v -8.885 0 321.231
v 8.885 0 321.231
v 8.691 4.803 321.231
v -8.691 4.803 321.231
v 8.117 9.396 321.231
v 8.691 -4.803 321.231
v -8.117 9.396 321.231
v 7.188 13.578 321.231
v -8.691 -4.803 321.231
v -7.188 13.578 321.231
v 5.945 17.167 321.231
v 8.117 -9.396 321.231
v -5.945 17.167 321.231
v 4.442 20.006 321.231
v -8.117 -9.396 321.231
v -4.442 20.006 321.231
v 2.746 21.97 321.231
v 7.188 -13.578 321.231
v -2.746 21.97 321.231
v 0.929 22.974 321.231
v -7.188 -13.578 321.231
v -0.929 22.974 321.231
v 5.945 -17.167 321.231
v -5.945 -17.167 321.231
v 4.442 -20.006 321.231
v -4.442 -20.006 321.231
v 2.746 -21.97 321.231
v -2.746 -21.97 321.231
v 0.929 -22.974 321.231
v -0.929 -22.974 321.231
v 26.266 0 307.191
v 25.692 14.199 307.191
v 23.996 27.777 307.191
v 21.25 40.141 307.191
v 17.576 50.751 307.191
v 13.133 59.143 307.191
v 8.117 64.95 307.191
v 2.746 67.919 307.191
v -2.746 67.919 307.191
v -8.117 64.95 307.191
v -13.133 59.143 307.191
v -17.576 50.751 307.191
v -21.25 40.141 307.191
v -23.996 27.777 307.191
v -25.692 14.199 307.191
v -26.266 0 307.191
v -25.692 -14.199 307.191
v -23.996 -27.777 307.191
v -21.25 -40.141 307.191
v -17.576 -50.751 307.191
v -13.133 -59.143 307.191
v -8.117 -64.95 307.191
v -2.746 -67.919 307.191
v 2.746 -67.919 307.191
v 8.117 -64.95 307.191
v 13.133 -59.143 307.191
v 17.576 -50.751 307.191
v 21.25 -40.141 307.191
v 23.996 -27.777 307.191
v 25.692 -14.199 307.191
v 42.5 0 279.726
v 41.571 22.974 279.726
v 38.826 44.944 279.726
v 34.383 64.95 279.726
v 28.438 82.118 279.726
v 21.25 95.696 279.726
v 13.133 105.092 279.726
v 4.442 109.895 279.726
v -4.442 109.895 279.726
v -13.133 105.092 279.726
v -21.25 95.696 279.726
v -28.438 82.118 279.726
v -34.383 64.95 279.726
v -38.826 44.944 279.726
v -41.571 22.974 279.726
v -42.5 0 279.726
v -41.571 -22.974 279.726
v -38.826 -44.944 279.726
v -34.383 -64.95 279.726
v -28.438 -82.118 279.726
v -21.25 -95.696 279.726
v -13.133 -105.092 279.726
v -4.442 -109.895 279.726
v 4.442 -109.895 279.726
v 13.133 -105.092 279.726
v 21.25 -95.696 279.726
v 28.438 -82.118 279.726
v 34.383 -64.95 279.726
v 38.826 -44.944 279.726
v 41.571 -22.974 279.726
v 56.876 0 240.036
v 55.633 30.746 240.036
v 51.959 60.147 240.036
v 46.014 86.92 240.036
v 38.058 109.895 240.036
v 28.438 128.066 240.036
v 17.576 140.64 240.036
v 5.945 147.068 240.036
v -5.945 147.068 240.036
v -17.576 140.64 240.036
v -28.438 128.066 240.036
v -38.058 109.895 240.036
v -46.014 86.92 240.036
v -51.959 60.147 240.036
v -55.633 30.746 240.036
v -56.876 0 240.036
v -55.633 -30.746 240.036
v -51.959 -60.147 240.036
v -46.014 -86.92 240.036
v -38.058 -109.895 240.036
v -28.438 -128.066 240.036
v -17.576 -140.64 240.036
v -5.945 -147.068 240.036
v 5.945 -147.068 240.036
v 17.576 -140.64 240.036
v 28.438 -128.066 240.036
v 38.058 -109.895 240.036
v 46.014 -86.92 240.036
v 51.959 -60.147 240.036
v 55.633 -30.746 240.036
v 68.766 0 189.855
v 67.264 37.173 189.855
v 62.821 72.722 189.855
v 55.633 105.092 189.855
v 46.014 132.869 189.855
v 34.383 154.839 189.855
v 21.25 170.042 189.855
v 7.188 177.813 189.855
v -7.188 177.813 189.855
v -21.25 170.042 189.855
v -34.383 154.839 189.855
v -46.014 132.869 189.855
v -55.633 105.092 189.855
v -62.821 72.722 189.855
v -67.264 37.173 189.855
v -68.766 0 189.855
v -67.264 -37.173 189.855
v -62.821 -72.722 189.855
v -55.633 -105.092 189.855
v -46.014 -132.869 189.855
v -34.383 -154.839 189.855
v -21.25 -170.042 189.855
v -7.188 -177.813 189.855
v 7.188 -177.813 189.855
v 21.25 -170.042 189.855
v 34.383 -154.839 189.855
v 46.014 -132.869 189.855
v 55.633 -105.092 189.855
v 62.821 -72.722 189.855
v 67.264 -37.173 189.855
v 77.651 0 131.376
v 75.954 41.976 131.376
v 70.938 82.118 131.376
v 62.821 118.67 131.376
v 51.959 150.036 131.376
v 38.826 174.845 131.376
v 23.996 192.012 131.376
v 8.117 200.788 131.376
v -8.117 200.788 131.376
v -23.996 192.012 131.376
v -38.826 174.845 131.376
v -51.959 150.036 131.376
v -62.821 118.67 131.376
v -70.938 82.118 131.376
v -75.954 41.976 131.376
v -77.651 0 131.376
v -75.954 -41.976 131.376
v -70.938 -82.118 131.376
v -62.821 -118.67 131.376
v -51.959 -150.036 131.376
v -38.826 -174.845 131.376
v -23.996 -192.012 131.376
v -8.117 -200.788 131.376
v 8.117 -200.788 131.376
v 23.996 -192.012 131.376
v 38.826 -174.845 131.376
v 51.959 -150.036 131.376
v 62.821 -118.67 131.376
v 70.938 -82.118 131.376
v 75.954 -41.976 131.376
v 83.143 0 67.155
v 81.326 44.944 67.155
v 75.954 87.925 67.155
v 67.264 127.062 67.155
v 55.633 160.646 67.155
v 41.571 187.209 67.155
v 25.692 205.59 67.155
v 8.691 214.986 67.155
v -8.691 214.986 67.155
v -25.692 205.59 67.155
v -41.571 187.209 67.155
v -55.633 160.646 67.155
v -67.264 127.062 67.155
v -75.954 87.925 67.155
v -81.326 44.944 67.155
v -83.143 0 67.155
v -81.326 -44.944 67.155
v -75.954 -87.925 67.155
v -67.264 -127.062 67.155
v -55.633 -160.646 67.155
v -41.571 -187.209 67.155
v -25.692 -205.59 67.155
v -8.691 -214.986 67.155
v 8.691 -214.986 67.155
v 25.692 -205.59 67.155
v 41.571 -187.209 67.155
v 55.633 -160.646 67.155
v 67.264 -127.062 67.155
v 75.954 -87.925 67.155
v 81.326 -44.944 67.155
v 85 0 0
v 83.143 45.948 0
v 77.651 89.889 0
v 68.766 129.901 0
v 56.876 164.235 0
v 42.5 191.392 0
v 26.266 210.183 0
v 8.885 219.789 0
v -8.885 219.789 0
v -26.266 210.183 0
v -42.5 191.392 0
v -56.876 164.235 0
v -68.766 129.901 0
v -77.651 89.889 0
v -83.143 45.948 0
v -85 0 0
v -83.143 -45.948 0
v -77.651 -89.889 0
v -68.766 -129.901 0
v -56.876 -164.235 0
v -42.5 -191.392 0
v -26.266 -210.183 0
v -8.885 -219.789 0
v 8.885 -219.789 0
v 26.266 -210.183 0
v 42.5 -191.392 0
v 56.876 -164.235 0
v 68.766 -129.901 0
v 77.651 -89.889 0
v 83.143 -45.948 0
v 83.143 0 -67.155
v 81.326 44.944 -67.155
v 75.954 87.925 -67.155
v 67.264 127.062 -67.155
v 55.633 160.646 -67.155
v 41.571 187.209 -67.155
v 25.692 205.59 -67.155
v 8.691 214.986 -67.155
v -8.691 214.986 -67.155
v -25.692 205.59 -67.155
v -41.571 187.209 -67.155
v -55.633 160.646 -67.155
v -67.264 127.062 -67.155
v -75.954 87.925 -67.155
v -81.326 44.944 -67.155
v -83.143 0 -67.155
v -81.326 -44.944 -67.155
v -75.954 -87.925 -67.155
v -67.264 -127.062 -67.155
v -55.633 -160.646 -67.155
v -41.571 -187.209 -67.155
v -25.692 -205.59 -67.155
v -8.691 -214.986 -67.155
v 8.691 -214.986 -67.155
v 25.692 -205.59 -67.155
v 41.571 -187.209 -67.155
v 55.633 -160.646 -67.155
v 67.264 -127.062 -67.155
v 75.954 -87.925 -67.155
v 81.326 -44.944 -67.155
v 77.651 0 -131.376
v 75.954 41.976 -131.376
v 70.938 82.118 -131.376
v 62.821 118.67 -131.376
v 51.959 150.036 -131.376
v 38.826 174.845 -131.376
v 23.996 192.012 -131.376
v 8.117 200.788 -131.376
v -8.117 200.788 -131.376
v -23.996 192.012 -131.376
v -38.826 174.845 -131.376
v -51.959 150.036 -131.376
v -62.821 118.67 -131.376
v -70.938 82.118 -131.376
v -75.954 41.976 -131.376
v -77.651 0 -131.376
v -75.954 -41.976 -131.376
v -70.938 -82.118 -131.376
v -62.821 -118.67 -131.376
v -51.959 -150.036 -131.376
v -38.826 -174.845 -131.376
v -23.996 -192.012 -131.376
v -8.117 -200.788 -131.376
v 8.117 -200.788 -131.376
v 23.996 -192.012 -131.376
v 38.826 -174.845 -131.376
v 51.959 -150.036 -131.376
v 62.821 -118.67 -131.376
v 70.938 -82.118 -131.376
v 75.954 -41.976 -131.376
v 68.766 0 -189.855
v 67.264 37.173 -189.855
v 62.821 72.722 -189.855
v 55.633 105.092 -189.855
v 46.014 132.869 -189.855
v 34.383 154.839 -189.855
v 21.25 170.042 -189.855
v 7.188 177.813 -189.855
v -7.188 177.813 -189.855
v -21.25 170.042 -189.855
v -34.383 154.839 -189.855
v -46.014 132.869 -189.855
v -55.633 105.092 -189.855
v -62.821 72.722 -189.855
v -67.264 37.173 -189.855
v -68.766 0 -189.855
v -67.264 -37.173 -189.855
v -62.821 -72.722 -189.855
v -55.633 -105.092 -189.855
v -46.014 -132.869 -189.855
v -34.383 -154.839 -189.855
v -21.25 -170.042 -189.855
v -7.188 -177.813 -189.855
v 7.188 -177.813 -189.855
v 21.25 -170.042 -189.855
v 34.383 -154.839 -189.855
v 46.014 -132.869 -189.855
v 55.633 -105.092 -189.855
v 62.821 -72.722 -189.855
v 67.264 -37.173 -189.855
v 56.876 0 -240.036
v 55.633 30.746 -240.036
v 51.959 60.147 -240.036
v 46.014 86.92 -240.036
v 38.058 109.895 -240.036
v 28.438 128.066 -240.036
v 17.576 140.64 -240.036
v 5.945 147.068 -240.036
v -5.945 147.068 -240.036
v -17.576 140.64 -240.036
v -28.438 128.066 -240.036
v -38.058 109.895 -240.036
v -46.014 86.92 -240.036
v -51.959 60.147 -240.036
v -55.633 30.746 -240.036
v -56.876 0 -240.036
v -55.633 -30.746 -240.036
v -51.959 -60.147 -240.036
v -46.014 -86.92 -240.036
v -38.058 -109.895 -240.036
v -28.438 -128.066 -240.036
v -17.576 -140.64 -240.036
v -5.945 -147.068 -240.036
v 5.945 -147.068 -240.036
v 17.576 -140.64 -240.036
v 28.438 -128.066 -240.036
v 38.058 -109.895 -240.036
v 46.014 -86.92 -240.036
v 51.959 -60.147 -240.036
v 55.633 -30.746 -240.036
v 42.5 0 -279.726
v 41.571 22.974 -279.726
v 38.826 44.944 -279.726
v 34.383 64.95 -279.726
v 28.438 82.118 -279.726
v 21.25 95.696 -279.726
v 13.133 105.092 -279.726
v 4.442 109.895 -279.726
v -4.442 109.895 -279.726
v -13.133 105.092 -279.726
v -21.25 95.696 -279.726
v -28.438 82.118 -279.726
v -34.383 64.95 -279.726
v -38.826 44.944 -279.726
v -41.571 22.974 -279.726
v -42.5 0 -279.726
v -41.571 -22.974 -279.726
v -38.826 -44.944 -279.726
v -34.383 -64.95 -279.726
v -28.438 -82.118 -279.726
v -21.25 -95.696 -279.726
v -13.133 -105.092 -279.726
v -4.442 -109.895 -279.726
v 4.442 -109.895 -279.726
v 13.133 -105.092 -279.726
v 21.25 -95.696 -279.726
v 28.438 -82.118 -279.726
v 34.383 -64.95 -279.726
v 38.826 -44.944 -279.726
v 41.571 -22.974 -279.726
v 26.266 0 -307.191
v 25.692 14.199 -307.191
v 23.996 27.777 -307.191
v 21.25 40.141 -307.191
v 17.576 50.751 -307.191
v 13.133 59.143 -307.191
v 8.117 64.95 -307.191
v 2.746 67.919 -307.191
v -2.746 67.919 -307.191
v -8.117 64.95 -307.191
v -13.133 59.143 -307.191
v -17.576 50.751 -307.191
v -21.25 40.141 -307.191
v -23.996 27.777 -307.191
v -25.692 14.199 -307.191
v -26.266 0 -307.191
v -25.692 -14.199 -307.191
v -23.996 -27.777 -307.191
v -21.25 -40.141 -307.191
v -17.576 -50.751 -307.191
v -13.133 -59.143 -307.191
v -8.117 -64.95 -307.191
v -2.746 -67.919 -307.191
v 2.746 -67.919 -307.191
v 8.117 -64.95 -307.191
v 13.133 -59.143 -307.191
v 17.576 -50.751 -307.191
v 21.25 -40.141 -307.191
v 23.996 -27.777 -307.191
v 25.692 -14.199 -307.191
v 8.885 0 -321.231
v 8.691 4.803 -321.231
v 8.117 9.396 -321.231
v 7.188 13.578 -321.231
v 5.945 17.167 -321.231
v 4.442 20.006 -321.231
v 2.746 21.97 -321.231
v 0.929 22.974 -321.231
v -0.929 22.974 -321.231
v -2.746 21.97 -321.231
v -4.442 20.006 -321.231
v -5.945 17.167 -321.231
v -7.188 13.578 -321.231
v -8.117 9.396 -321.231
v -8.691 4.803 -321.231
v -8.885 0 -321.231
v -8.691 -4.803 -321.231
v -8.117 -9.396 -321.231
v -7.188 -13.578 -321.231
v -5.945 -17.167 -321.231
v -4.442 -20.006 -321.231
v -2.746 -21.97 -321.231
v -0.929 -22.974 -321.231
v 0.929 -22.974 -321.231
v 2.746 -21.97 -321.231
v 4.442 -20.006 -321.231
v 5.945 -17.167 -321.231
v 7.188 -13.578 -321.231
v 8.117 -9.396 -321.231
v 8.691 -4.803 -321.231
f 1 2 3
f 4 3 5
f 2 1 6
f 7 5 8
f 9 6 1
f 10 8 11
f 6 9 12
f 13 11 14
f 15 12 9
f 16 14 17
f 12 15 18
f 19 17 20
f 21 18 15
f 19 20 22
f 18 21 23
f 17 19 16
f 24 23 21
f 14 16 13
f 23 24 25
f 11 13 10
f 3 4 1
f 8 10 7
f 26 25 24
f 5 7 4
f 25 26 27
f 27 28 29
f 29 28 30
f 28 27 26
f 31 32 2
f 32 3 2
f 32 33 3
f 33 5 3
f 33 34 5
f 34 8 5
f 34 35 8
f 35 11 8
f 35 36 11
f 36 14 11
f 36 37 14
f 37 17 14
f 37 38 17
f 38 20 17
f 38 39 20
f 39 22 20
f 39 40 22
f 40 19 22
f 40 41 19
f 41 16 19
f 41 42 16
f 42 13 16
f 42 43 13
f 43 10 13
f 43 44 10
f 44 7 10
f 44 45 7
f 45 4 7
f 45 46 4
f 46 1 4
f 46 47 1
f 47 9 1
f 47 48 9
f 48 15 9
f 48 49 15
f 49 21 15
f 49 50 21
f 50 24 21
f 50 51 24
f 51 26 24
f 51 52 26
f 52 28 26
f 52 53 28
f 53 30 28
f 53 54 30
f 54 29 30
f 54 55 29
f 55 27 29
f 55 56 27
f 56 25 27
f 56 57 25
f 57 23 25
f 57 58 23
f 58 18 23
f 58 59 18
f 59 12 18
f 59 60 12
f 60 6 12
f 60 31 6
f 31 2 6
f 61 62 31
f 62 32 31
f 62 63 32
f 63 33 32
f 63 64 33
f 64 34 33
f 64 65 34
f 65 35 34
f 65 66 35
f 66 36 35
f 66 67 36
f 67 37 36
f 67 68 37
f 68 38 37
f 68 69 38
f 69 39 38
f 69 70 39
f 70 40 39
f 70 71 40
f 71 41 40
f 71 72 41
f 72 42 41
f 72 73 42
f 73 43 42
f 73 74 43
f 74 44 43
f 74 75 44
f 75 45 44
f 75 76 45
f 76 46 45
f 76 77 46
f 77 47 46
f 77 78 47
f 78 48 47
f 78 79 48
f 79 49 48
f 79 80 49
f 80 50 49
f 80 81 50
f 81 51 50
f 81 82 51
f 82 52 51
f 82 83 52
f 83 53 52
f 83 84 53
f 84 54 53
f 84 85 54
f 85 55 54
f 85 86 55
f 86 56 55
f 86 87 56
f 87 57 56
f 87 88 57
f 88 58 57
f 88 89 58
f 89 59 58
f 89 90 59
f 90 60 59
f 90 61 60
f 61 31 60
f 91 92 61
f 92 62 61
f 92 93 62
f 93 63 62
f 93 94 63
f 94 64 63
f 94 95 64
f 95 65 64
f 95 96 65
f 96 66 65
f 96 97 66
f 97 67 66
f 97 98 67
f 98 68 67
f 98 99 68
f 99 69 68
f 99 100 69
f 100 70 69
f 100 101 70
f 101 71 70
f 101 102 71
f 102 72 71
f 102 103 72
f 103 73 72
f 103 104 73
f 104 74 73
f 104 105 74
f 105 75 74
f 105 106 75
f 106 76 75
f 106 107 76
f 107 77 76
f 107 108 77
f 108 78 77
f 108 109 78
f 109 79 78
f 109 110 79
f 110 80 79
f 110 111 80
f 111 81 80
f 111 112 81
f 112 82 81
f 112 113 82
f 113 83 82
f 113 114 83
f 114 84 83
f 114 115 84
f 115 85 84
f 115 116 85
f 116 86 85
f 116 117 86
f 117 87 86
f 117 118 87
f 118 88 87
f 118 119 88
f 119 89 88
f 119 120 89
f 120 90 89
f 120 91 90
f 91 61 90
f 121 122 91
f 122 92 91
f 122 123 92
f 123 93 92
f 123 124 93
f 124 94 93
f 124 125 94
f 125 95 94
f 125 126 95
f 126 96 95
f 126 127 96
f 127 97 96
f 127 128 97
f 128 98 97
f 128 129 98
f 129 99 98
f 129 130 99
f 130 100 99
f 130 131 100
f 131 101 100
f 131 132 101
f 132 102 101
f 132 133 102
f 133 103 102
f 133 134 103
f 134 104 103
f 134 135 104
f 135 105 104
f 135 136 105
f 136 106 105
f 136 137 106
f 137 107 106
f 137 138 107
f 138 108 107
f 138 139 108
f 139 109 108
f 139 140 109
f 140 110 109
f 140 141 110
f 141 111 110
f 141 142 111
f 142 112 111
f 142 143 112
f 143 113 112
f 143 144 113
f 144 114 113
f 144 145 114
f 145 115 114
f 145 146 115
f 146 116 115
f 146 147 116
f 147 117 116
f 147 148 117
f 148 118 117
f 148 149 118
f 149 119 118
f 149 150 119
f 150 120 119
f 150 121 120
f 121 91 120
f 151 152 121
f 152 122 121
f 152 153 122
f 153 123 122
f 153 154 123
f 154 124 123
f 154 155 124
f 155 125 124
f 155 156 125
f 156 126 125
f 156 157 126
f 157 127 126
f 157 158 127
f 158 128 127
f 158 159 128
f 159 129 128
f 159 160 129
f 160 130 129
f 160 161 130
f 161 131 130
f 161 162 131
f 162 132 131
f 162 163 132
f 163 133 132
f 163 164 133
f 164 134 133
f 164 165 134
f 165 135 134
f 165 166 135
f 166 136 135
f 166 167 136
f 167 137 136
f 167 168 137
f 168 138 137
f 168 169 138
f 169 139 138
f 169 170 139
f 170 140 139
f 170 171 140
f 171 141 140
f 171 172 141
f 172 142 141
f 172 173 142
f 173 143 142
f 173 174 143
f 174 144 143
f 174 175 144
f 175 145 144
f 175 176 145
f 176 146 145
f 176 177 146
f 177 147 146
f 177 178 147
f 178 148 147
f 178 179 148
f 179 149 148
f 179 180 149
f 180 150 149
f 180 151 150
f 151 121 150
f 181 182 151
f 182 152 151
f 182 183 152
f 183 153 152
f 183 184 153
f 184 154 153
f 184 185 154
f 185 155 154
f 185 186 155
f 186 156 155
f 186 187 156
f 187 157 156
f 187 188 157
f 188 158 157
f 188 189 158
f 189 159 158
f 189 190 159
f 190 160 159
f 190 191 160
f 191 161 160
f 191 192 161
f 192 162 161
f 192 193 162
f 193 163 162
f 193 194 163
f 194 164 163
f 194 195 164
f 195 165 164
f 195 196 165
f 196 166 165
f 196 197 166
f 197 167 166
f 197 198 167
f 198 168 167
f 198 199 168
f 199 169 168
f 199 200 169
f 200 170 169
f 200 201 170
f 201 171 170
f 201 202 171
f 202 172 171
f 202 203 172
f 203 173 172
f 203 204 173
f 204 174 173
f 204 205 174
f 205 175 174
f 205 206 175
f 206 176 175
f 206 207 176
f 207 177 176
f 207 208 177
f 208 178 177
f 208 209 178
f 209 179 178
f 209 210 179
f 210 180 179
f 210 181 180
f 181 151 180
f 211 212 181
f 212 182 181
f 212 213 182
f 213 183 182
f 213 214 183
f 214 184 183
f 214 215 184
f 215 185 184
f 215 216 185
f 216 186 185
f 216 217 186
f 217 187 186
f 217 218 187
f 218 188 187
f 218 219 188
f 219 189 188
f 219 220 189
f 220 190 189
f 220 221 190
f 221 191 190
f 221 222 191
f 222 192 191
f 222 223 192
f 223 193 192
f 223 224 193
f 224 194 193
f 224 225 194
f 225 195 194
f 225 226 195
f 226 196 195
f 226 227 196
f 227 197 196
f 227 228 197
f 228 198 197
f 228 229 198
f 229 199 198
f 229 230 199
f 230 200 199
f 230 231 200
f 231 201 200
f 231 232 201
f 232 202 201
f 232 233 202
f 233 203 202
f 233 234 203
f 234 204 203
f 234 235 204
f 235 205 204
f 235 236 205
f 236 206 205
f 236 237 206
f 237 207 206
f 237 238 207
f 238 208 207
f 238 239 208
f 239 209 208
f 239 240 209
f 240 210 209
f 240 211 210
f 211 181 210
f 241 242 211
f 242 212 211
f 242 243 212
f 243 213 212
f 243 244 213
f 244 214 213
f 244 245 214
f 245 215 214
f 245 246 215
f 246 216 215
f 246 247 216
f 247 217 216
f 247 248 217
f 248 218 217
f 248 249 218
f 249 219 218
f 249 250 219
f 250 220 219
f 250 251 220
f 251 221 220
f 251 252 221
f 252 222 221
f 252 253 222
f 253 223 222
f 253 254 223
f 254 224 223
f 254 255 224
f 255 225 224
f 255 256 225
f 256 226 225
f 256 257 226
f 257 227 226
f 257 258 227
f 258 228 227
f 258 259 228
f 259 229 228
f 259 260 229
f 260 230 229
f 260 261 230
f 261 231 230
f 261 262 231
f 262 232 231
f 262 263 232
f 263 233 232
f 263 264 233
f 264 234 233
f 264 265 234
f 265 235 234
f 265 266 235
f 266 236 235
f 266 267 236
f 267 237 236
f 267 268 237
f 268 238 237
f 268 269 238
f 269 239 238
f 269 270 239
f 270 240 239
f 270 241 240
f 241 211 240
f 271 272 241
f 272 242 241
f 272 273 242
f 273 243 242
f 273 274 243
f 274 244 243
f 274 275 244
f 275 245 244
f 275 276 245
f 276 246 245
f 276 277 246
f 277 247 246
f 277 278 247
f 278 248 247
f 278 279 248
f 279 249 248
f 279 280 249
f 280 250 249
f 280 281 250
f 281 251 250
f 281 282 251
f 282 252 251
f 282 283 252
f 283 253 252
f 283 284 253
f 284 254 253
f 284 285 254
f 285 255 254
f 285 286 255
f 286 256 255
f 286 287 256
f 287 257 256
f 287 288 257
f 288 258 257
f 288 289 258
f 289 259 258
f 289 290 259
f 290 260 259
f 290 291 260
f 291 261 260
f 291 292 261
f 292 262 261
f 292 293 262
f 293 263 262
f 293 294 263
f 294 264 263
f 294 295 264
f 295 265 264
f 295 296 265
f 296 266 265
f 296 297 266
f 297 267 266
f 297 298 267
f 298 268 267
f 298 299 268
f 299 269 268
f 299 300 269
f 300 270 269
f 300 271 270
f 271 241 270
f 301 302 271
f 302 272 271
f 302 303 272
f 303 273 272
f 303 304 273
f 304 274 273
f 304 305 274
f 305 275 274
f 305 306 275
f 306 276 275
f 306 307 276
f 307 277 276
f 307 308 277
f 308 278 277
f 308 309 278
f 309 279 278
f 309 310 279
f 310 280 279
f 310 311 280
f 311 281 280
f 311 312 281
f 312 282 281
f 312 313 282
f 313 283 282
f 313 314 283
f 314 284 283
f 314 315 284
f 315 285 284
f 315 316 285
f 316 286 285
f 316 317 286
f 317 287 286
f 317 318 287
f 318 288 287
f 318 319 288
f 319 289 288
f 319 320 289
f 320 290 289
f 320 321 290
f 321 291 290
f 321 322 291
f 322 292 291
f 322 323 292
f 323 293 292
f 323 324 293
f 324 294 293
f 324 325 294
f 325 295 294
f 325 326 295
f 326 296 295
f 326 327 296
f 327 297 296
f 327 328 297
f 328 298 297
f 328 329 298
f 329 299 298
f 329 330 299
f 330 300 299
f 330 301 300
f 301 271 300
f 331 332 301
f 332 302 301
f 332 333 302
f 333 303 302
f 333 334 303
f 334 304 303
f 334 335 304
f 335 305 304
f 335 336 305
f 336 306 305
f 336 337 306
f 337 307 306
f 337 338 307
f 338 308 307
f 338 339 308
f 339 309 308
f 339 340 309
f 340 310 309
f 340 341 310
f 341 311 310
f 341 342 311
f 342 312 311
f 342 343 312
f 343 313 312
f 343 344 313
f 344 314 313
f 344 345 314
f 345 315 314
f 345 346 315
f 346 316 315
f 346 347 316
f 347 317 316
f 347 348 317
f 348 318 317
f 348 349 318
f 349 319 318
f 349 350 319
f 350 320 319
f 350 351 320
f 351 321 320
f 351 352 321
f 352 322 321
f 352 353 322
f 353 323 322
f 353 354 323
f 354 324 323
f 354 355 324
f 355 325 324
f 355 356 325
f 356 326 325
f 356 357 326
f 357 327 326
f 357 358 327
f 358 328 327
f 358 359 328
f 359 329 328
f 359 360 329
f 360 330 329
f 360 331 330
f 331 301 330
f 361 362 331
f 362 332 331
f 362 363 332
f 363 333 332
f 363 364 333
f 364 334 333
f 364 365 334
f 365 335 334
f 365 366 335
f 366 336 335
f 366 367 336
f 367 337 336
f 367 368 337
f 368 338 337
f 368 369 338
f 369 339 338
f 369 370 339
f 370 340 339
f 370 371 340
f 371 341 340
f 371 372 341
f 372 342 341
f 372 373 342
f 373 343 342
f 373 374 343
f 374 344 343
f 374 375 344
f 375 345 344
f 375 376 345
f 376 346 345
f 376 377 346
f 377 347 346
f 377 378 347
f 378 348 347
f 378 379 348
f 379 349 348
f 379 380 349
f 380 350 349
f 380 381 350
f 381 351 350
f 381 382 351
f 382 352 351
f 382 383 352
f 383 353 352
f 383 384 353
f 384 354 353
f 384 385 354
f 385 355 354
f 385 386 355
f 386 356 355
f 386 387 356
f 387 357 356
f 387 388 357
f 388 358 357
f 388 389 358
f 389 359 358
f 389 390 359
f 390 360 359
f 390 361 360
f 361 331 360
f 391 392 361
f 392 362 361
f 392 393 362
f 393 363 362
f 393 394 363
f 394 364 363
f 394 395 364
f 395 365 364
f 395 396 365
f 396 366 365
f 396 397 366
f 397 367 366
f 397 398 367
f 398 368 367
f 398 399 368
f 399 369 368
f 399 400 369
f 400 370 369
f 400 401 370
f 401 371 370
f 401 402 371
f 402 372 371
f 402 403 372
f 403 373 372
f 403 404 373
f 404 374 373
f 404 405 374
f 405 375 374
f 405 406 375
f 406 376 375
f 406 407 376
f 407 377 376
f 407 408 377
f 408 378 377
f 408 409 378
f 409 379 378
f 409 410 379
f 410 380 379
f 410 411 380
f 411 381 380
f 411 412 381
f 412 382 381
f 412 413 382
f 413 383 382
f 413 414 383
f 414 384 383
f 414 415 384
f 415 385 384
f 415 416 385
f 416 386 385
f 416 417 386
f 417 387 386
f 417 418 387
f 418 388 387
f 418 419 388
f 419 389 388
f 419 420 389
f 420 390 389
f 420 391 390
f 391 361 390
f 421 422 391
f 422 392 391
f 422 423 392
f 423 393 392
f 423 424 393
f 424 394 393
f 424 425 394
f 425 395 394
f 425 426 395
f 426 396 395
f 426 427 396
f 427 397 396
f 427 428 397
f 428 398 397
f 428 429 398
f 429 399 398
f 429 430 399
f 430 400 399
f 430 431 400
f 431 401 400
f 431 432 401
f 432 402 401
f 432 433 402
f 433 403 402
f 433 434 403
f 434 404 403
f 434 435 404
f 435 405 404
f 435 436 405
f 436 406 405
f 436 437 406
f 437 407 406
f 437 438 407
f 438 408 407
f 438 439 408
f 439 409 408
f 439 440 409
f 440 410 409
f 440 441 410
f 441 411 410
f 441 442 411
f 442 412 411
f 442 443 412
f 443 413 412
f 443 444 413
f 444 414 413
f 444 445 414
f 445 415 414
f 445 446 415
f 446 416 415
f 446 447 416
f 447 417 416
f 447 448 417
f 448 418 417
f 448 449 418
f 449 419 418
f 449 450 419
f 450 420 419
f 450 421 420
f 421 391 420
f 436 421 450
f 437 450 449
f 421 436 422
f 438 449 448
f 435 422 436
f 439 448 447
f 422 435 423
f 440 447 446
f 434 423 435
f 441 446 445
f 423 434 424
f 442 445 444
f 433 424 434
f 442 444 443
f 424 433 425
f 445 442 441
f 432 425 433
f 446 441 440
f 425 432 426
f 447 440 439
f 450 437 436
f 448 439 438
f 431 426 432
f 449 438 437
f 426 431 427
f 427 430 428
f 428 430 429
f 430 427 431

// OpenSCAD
// Generated by SolidPython 1.0.1 on 2020-07-29 00:46:46


scale(v = [5, 13, 19]) {
	sphere(r = 17);
}
/***********************************************
*********      SolidPython code:      **********
************************************************
 
# import packages: SolidPython
from solid import *
from solid.utils import *
from itertools import chain, combinations, permutations


class Resize:

    def __init__(self, scad_file):
        self.scad_file = scad_file
        #self.scad_file = import_scad(scad_file)
        # cone/cylinder param:
        self.r1 = 0
        self.r2 = 0
        self.h = 0
        # rectangular prism param:
        self.w = 0
        self.l = 0
        # ellipse param:
        self.r = 0

    # import OpenScad code (file name corresponds to shape)


    # classify shape + parameters
    def assign(self, param1, param2, param3):
        if self.scad_file == 'cone.scad':
            self.r1 = param1
            self.r2 = param2
            self.h = param3
        elif self.scad_file == 'cylinder.scad':
            self.r1 = param1
            self.r2 = param2
            self.h = param3
        elif self.scad_file == 'rectangularPrism.scad':
            self.h = param1
            self.l = param2
            self.w = param3
        else:
            self.r = param1
            self.h = param2

    # resize parameters
    def iterate(self):
        x = range(3, 20, 2)
        i = 1
        if self.scad_file == 'cone.scad':
            tempList = list(permutations(x, 2))
            for temp in tempList:
                param1 = temp[0]
                param2 = temp[1]
                filepath = 'produced_scad_files/' + 'cone' + str(param1) + '_' + str(param2) + '_' + '.scad'
                scad_render_to_file(cylinder(h=param1, r1=param2, r2=0), filepath)

        elif self.scad_file == 'cylinder.scad':
            tempList = list(permutations(x, 3))
            for temp in tempList:
                param1 = temp[0]
                param2 = temp[1]
                filepath = 'produced_scad_files/' + 'cylinder' + str(param1) + '_' + str(param2) + '_' + '.scad'
                scad_render_to_file(cylinder(h=param1, r1=param2, r2=param2), filepath)

        elif self.scad_file == 'rectangularPrism.scad':
            tempList = list(permutations(x, 3))
            for temp in tempList:
                param1 = temp[0]
                param2 = temp[1]
                param3 = temp[2]
                filepath = 'produced_scad_files/' + 'rectangularPrism' + str(param1) + '_' + str(param2) + '_' + str(
                    param3) + '.scad'
                scad_render_to_file(cube(size=(param1, param2, param3)), filepath)

        elif self.scad_file == 'ellipse.scad':
            tempList = list(permutations(x, 4))
            for temp in tempList:
                param1 = temp[0]
                param2 = temp[1]
                param3 = temp[2]
                param4 = temp[3]
                filepath = 'produced_scad_files/' + 'ellipse' + str(param1) + '_' + str(param2) + '_' + str(param3) + '_' + str(param4) + '.scad'
                scad_render_to_file(scale([param1, param2, param3])(sphere(r=param4)), filepath)

    def render_to_scadfile(self):
        scad_render_to_file(scad, 'example.scad') 
 
************************************************/
